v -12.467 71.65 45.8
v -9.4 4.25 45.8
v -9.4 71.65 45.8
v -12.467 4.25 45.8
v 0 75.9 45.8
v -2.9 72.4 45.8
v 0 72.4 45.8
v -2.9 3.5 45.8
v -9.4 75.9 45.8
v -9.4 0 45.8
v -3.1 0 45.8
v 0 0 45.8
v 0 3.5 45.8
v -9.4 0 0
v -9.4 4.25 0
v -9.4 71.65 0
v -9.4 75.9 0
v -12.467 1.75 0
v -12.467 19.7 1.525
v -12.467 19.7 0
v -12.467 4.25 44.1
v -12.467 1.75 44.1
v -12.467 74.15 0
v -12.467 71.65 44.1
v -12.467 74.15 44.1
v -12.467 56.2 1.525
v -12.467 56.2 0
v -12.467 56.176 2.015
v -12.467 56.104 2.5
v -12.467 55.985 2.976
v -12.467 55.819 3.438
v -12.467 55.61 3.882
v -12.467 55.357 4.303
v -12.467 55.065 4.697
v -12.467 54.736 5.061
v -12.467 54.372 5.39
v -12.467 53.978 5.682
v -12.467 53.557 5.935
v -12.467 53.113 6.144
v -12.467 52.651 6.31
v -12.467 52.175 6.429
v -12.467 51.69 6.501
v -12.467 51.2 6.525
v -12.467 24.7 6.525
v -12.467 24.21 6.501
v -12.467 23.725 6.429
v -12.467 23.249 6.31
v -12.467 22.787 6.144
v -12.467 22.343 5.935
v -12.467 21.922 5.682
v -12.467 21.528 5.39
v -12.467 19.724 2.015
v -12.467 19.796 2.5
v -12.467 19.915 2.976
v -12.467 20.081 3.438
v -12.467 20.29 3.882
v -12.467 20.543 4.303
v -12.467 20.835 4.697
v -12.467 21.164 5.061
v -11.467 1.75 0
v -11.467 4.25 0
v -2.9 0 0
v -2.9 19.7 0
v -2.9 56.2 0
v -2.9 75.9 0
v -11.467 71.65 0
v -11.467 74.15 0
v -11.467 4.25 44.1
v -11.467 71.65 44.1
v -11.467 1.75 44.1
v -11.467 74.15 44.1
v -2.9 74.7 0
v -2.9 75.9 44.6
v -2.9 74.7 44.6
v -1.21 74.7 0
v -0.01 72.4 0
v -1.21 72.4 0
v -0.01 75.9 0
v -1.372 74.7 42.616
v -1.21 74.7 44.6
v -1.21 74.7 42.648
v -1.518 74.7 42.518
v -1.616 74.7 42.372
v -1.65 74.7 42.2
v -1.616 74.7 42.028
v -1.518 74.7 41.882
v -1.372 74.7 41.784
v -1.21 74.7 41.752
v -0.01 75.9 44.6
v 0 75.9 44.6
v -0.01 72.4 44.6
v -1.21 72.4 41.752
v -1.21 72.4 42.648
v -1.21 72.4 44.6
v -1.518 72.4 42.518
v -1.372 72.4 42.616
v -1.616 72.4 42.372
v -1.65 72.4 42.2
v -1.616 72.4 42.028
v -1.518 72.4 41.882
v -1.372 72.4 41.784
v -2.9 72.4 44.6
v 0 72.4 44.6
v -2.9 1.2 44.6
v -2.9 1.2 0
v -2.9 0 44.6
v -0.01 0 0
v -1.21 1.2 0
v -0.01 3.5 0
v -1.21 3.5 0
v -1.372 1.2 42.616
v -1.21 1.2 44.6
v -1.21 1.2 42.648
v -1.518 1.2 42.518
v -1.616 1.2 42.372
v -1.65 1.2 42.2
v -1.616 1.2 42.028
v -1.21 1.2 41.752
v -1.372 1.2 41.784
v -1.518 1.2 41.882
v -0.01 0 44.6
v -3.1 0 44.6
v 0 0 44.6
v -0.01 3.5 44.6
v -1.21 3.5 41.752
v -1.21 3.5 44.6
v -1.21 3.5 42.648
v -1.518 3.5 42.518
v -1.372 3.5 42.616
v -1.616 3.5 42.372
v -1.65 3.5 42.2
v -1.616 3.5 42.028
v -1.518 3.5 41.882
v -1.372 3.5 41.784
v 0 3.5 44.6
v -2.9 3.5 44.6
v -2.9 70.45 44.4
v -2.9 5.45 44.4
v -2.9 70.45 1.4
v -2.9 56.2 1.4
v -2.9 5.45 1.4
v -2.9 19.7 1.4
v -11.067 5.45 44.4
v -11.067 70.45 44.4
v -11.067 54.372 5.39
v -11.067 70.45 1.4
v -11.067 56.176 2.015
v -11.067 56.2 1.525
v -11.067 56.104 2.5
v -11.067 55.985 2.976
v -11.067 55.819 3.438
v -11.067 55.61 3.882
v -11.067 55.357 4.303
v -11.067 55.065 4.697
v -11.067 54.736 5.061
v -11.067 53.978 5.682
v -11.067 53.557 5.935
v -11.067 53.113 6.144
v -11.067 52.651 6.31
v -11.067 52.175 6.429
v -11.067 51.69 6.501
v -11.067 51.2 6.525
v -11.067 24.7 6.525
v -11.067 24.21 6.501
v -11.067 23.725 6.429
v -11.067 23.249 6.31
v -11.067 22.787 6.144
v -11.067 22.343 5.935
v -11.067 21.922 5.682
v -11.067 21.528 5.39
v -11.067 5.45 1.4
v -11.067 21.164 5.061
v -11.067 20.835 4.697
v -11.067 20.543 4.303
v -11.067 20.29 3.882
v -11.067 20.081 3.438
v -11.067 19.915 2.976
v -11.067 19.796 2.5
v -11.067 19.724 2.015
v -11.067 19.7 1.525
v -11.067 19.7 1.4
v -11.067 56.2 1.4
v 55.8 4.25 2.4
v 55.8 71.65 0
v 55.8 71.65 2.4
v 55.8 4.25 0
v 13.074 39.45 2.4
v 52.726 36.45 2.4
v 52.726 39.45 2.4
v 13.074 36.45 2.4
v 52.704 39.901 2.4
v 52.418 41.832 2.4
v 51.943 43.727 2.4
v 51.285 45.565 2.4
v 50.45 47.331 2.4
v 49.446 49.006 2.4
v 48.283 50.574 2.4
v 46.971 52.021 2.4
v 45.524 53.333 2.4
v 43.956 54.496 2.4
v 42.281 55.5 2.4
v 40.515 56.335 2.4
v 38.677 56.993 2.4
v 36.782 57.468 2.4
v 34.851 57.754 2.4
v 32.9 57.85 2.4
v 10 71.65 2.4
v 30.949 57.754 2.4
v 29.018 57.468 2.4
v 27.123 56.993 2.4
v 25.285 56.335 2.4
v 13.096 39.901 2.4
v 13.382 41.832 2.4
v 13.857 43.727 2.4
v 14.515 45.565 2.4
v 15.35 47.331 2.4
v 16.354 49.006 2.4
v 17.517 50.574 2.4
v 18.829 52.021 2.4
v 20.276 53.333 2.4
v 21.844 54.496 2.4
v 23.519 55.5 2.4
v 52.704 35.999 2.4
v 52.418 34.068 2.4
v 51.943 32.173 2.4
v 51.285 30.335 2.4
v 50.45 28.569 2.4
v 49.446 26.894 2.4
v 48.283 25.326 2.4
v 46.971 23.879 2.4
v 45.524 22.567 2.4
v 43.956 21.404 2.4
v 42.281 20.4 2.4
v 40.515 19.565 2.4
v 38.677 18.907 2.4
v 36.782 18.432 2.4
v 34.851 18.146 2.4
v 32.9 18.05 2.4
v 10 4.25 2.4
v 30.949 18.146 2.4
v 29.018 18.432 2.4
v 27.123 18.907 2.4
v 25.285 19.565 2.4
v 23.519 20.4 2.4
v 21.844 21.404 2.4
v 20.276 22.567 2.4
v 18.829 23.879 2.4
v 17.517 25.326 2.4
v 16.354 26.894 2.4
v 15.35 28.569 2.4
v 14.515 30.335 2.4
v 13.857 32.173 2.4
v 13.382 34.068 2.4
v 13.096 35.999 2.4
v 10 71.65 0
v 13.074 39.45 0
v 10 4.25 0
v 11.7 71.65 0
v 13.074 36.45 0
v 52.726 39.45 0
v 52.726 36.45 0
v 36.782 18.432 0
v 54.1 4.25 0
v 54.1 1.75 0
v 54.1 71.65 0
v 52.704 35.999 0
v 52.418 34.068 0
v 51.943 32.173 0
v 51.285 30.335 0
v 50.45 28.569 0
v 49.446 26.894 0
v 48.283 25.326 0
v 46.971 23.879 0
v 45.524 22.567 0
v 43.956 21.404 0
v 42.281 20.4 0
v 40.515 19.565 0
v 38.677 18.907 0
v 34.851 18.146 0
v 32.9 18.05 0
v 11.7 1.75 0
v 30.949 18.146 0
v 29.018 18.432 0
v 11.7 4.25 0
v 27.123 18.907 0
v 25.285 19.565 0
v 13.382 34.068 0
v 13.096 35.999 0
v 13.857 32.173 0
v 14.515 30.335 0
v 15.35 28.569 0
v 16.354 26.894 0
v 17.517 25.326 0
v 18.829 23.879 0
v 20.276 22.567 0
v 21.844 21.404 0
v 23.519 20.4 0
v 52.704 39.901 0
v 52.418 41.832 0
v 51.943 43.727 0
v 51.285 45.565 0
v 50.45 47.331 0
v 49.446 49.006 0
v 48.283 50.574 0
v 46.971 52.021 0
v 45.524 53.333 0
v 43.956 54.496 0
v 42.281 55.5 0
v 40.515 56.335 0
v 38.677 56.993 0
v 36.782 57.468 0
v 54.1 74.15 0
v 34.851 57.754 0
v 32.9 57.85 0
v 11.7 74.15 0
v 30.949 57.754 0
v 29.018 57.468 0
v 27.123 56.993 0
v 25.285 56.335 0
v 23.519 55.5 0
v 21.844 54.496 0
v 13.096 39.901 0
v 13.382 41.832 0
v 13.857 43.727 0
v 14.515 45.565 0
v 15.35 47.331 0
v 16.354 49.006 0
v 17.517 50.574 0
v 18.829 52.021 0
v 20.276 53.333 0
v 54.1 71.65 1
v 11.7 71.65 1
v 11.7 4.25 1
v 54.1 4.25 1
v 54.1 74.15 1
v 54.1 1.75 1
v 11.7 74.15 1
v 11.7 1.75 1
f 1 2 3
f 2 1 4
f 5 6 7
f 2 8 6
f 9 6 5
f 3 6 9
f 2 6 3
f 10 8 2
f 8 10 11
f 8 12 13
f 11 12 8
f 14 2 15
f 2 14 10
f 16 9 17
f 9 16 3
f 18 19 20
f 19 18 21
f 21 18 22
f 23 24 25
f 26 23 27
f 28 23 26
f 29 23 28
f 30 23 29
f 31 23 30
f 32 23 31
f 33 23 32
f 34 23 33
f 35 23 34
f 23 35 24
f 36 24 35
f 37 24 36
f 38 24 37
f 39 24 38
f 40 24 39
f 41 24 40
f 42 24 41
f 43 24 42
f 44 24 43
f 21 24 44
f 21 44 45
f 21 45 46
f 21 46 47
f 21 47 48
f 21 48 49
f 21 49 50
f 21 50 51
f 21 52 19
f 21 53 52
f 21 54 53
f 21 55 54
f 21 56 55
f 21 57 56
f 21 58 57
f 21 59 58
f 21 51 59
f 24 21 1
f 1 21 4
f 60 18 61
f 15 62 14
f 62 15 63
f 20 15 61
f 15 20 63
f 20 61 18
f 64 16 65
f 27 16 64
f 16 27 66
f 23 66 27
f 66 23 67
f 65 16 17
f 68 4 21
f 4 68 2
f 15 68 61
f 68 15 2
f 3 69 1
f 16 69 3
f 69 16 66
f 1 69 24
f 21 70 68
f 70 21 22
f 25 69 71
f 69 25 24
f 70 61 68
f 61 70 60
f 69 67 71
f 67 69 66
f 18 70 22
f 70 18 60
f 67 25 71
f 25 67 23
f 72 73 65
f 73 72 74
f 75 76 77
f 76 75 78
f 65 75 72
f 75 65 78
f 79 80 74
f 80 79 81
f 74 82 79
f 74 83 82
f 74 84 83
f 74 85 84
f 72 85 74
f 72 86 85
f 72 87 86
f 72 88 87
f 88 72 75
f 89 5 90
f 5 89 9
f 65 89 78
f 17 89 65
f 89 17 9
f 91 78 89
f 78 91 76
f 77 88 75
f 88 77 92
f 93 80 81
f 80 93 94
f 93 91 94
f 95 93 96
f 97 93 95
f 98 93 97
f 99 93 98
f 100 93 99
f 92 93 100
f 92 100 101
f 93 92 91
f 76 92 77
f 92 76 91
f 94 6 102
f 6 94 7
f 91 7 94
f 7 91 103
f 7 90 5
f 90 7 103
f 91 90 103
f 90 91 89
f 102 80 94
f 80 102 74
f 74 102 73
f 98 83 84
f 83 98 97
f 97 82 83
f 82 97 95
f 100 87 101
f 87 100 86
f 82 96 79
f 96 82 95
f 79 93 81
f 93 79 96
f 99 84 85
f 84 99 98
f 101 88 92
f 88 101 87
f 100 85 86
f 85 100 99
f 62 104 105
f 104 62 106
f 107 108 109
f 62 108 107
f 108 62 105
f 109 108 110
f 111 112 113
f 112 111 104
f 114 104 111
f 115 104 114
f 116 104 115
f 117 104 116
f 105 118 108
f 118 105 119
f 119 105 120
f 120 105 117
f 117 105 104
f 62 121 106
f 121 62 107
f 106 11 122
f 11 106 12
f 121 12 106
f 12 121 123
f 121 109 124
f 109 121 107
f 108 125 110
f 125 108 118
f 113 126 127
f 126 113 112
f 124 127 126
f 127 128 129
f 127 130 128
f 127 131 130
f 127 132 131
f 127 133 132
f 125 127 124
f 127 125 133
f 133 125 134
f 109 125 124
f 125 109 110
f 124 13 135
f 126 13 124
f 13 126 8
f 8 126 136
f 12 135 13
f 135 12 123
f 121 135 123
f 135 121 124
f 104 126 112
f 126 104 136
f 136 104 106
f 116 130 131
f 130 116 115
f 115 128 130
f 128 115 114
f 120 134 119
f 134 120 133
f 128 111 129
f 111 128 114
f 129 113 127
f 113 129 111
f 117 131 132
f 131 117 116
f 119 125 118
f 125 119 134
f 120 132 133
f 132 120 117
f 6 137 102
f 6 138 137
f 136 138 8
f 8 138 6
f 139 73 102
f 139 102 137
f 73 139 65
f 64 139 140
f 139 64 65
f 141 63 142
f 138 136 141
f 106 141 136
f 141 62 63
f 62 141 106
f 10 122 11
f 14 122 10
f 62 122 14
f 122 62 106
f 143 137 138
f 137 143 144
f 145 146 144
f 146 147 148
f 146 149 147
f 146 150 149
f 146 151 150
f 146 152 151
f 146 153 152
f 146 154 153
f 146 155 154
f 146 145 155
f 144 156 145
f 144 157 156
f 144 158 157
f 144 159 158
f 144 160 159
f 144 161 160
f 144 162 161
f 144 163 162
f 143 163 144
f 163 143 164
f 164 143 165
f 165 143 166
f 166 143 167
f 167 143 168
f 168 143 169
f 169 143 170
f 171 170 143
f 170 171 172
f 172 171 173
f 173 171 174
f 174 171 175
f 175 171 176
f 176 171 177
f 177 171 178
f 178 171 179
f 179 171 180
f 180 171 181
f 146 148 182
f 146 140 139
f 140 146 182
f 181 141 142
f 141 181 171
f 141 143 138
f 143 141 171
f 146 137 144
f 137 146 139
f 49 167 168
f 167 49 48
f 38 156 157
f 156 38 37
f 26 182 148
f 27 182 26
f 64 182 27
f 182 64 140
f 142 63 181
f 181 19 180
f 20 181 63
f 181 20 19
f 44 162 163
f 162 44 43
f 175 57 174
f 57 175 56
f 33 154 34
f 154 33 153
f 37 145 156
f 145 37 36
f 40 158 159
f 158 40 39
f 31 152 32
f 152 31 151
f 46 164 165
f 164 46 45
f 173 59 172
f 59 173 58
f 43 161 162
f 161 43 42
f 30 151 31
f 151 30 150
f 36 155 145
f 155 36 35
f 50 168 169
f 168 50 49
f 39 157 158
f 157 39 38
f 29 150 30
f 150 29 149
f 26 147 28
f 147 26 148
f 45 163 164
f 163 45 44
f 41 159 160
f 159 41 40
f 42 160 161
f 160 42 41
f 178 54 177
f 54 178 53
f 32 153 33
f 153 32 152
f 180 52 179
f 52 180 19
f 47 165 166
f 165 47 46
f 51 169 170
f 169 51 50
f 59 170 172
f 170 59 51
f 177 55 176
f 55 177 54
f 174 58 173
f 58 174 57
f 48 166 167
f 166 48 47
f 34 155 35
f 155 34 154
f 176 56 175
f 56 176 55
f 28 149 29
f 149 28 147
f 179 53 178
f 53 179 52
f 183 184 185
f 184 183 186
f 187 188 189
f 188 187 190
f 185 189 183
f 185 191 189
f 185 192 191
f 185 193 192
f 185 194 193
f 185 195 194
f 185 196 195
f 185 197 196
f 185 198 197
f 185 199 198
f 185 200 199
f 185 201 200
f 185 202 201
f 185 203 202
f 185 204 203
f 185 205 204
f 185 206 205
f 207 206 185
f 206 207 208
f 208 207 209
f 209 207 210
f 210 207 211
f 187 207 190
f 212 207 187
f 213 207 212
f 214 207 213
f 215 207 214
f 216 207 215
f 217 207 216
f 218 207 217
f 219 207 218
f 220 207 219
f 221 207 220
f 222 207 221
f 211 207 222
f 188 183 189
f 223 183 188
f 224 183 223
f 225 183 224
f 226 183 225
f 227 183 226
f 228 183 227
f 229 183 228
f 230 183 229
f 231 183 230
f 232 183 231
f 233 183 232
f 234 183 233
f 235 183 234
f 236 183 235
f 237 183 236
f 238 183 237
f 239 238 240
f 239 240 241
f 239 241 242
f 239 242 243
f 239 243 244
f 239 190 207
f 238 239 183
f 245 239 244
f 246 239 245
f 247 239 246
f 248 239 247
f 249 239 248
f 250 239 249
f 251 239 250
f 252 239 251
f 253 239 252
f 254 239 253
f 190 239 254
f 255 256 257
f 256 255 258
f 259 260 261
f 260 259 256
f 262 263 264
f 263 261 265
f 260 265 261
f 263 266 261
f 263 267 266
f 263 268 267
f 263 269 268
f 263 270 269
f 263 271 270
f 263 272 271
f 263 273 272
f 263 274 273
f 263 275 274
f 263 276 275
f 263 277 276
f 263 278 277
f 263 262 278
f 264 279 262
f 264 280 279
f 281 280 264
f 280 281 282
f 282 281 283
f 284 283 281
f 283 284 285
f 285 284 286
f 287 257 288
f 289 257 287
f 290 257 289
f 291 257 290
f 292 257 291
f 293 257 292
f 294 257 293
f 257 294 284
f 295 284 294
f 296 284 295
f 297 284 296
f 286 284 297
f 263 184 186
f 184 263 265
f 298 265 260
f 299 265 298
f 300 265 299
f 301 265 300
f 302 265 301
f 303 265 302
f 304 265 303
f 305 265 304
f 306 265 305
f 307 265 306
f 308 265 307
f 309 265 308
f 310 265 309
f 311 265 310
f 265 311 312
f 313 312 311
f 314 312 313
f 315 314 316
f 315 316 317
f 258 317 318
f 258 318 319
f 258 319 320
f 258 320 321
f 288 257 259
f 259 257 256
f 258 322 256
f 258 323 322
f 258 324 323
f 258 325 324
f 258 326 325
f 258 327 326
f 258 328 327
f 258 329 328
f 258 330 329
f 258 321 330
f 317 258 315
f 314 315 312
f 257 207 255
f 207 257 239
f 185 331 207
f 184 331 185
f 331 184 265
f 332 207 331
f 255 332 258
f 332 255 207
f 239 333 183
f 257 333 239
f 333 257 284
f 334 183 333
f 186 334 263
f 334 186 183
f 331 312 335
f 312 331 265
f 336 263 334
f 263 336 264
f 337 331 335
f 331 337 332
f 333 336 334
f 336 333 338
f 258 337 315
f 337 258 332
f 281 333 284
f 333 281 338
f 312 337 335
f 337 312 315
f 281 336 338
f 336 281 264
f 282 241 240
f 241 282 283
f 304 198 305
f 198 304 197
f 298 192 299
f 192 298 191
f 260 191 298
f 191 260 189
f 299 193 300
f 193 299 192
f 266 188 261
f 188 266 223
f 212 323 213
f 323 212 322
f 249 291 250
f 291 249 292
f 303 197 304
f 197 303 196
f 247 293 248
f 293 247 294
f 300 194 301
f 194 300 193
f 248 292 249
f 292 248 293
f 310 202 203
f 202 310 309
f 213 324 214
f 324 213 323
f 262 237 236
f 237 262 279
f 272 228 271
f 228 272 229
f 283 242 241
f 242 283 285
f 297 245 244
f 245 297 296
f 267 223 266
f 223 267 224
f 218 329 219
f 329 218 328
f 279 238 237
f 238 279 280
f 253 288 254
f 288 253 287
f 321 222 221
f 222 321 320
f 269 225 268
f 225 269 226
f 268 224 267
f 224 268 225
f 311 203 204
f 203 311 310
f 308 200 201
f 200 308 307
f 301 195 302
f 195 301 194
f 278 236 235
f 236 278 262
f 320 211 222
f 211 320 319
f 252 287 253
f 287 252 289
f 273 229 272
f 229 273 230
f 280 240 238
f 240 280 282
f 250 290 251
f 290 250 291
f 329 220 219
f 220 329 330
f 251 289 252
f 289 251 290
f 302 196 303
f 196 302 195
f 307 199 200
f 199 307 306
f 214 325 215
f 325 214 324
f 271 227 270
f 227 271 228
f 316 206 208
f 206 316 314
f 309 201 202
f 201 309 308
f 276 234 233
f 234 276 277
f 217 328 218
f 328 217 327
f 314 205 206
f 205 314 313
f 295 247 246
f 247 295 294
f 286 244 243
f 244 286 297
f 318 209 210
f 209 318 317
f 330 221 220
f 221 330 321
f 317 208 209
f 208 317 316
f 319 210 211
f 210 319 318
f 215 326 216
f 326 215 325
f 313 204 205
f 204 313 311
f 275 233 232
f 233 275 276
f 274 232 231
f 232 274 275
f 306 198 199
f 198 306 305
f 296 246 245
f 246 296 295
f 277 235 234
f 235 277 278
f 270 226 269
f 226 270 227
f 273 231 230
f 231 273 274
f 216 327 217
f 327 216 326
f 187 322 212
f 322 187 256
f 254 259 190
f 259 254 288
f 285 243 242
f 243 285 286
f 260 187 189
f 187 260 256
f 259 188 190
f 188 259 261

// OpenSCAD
/*
 * Author:  Jean Philippe Neumann
 * License: Creative Commons Attribution-ShareAlike 3.0 Unported License
 *          see http://creativecommons.org/licenses/by-sa/3.0/
 * URL:     http://www.thingiverse.com/thing:94611
 */
 
// MakerBot customizer settings:
// preview[view:south east, tilt:top diagonal]

/*
 * parameters
 */

/* [primary parameters] */

// how many card holders to print
numberOfHolders = 1;
// how many lids to print
numberOfLids = 1;

// the length of your cards in mm
cardY = 63;
// the width of your cards in mm
cardX = 41;
// the height of the stack of cards you want to store in mm
cardStackZ = 6;

// The fudge factor allows fine tuning the distances between parts in the lock and key mechanisms of the holder. The right value is highly dependent on your printer. Is everything fitting too tight? Try increasing the factor by 0.1. Is everything fitting too loose? Try decreasing the factor by 0.1.
fudgeFactor = 0.5;

/* [secondary parameters] */

longWallStrength = 1.4;
shortWallStrength = 1.2;
bottomWallStrength = 1.4;

// thickness of the lower part of the lock mechanism
lowerLockY = 1.2;
// height of the lower part of the lock mechanism
lowerLockZ = 1.7;
// thickness of the upper part of the lock mechanism
upperLockY = 3.5;
// height of the upper part of the lock mechanism
upperLockZ = 1.2;
// how high is the part of the lid that slides in the locks rail
keyRailZLid = 1.0;
// how high is the part of the holders body that slides in the locks rail
keyRailZBody = 1.0;

// how thick the bit of plastic is that blocks the end of the lock's rail
stopBitStrength = 1.2;
// the "lock nub" is a tiny bump near the end of the lock's rail that makes other holders or lids snap in. This variable sets the size of that nub.
lockNubRadius = 0.45;
// position of the "lock nub"
lockNubDistanceToCorner = 3*stopBitStrength;

// how much extra space to leave around cards
spaceAroundCard = 1;
// how strong the lid's grip is
lidGripStrength = 3;
// how alrge the hole in the lid is
lidHoleRadius = (cardX + 2*spaceAroundCard + 2*longWallStrength)/2 - lidGripStrength;

// distance between objects on the print bed
printDistance = 10;

/* derived parameters */
/* [Hidden] */

release = 1;

// holder main body parameters
bodyX = cardX + 2*spaceAroundCard + 2*longWallStrength;
bodyY = cardY + 2*spaceAroundCard + 2*shortWallStrength + 2*upperLockY + 3*fudgeFactor;
bodyZ = cardStackZ + spaceAroundCard/2;

// lock, key and lid parameters
lockZ = lowerLockZ + upperLockZ;
keyZ = lowerLockZ + upperLockZ + fudgeFactor/3;
lidZ = lowerLockZ + upperLockZ - fudgeFactor;
keyRailX = bodyX - 2*stopBitStrength - 2*fudgeFactor;
keyRailY = upperLockY - lowerLockY + 0.7 - fudgeFactor;
keyMainY = cardY + 2*spaceAroundCard + 2*shortWallStrength;

// space around the card stack
cardSpaceX = cardX + 2*spaceAroundCard;
cardSpaceY = cardY + 2*spaceAroundCard;

// hole in the side of the holder
grabHoleX = longWallStrength + cardX/8;
grabHoleY = cardY * 1/2;

// misc 
holderZ = bodyZ + keyZ + lockZ;

/*
 * putting it all together
 */

if(numberOfHolders != 0) {
	for(i=[0:numberOfHolders-1]) {
		translate([-i*(printDistance + holderZ),0,0])
		
		if(release == 1) {
			translate([-holderZ, bodyY, 0])
			rotate([0,-90,180])
			holder();
		} else {
			translate([-bodyX, 0, 0])
			holder();
		}
	}
}

if(numberOfLids != 0) {
	for(i=[0:numberOfLids-1]) {
		translate([i*(printDistance + bodyX) + printDistance,0,0])
		lid();
	}
}

/*
 * modules
 */

module lid() {
	union() {
		difference() {
			key(bodyX, keyMainY, lidZ, keyRailX, keyRailY, keyRailZLid, true);
			
			translate([bodyX/2, bodyY/2, -1])
			cylinder(h=lidZ+2, r=lidHoleRadius, $fn=64);
		}
		translate([0, (bodyY-lidGripStrength)/2,0])
		cube([bodyX, lidGripStrength ,lidZ]);
	}
}

module key(mainX, mainY, mainZ, railX, railY, railZ, lidMode) {
	railPartY = 2*railY + mainY;
	
	translate([(bodyX-mainX)/2, (bodyY-mainY)/2,0])
	union() {
		color([0.5,0.7,0.9])
		cube([mainX, mainY, mainZ]);
		
		color([0.7,0.7,0.9])
		translate([(mainX-railX)/2,(mainY-railPartY)/2,0])
		cube([railX, railPartY, railZ]);
		
		if(lidMode == false) {
			color([1,0,0])
			translate([0, -(railPartY-mainY)/2, 0])
			cube([(mainX-railX)/2,railPartY,railZ]);
		}
	}
}

module holder() {
	difference() {
		union() {
			key(bodyX, keyMainY, keyZ, keyRailX, keyRailY, keyRailZBody, false);
			
			translate([0,0,keyZ])
			cube([bodyX, bodyY, bodyZ]);
			
			translate([0,0,bodyZ+keyZ])
			lock(bodyX, lowerLockY, lowerLockZ, upperLockY, upperLockZ);
		}
		cardSpace();
		grabHole();
	}
}

module cardSpace() {
	color([1,0,0])
	translate([(bodyX-cardSpaceX)/2,(bodyY-cardSpaceY)/2,bottomWallStrength])
	cube([cardSpaceX, cardSpaceY, bodyZ+keyZ+bottomWallStrength]);
}

module grabHole() {
	cylinderRadius = 5;
	cubeX = grabHoleX-cylinderRadius;
	cubeY = grabHoleY-cylinderRadius;
	posY = (bodyY-cubeY)/2;
	
	$fn=64;
	translate([0, posY, -1])
	minkowski() {
		cube([cubeX, cubeY, bodyZ+keyZ+2]);
		cylinder(r=cylinderRadius, h=1);
	}
}

module lock() {
	union() {
		lockPart();
		mirror([0,1,0]) {
			translate([0,-bodyY,0])
			lockPart();
		}
	}
}

module lockPart() {
	union() {
		// lower lock
		color([0.9,0.4,0.3])
		cube([bodyX, lowerLockY, lowerLockZ]);
		
		// upper lock
		// subtracting 0.01 because of strange holes in the generated STL file
		translate([0,0,lowerLockZ-0.01])
		cube([bodyX, upperLockY, upperLockZ]);
		
		// stop bit
		color([0,1,0])
		// extra large lock bit / translate -Z because of strange holes in the generated STL file
		translate([bodyX-stopBitStrength, 0, -0.2])
		cube([stopBitStrength, upperLockY, lockZ+0.2]);
		
		// safety nub
		color([1,0,0])
		translate([bodyX-lockNubDistanceToCorner, upperLockY, lowerLockZ])
		rotate([90,0,0])
		cylinder(r=lockNubRadius, h=upperLockY, $fn=16);
	}
}
